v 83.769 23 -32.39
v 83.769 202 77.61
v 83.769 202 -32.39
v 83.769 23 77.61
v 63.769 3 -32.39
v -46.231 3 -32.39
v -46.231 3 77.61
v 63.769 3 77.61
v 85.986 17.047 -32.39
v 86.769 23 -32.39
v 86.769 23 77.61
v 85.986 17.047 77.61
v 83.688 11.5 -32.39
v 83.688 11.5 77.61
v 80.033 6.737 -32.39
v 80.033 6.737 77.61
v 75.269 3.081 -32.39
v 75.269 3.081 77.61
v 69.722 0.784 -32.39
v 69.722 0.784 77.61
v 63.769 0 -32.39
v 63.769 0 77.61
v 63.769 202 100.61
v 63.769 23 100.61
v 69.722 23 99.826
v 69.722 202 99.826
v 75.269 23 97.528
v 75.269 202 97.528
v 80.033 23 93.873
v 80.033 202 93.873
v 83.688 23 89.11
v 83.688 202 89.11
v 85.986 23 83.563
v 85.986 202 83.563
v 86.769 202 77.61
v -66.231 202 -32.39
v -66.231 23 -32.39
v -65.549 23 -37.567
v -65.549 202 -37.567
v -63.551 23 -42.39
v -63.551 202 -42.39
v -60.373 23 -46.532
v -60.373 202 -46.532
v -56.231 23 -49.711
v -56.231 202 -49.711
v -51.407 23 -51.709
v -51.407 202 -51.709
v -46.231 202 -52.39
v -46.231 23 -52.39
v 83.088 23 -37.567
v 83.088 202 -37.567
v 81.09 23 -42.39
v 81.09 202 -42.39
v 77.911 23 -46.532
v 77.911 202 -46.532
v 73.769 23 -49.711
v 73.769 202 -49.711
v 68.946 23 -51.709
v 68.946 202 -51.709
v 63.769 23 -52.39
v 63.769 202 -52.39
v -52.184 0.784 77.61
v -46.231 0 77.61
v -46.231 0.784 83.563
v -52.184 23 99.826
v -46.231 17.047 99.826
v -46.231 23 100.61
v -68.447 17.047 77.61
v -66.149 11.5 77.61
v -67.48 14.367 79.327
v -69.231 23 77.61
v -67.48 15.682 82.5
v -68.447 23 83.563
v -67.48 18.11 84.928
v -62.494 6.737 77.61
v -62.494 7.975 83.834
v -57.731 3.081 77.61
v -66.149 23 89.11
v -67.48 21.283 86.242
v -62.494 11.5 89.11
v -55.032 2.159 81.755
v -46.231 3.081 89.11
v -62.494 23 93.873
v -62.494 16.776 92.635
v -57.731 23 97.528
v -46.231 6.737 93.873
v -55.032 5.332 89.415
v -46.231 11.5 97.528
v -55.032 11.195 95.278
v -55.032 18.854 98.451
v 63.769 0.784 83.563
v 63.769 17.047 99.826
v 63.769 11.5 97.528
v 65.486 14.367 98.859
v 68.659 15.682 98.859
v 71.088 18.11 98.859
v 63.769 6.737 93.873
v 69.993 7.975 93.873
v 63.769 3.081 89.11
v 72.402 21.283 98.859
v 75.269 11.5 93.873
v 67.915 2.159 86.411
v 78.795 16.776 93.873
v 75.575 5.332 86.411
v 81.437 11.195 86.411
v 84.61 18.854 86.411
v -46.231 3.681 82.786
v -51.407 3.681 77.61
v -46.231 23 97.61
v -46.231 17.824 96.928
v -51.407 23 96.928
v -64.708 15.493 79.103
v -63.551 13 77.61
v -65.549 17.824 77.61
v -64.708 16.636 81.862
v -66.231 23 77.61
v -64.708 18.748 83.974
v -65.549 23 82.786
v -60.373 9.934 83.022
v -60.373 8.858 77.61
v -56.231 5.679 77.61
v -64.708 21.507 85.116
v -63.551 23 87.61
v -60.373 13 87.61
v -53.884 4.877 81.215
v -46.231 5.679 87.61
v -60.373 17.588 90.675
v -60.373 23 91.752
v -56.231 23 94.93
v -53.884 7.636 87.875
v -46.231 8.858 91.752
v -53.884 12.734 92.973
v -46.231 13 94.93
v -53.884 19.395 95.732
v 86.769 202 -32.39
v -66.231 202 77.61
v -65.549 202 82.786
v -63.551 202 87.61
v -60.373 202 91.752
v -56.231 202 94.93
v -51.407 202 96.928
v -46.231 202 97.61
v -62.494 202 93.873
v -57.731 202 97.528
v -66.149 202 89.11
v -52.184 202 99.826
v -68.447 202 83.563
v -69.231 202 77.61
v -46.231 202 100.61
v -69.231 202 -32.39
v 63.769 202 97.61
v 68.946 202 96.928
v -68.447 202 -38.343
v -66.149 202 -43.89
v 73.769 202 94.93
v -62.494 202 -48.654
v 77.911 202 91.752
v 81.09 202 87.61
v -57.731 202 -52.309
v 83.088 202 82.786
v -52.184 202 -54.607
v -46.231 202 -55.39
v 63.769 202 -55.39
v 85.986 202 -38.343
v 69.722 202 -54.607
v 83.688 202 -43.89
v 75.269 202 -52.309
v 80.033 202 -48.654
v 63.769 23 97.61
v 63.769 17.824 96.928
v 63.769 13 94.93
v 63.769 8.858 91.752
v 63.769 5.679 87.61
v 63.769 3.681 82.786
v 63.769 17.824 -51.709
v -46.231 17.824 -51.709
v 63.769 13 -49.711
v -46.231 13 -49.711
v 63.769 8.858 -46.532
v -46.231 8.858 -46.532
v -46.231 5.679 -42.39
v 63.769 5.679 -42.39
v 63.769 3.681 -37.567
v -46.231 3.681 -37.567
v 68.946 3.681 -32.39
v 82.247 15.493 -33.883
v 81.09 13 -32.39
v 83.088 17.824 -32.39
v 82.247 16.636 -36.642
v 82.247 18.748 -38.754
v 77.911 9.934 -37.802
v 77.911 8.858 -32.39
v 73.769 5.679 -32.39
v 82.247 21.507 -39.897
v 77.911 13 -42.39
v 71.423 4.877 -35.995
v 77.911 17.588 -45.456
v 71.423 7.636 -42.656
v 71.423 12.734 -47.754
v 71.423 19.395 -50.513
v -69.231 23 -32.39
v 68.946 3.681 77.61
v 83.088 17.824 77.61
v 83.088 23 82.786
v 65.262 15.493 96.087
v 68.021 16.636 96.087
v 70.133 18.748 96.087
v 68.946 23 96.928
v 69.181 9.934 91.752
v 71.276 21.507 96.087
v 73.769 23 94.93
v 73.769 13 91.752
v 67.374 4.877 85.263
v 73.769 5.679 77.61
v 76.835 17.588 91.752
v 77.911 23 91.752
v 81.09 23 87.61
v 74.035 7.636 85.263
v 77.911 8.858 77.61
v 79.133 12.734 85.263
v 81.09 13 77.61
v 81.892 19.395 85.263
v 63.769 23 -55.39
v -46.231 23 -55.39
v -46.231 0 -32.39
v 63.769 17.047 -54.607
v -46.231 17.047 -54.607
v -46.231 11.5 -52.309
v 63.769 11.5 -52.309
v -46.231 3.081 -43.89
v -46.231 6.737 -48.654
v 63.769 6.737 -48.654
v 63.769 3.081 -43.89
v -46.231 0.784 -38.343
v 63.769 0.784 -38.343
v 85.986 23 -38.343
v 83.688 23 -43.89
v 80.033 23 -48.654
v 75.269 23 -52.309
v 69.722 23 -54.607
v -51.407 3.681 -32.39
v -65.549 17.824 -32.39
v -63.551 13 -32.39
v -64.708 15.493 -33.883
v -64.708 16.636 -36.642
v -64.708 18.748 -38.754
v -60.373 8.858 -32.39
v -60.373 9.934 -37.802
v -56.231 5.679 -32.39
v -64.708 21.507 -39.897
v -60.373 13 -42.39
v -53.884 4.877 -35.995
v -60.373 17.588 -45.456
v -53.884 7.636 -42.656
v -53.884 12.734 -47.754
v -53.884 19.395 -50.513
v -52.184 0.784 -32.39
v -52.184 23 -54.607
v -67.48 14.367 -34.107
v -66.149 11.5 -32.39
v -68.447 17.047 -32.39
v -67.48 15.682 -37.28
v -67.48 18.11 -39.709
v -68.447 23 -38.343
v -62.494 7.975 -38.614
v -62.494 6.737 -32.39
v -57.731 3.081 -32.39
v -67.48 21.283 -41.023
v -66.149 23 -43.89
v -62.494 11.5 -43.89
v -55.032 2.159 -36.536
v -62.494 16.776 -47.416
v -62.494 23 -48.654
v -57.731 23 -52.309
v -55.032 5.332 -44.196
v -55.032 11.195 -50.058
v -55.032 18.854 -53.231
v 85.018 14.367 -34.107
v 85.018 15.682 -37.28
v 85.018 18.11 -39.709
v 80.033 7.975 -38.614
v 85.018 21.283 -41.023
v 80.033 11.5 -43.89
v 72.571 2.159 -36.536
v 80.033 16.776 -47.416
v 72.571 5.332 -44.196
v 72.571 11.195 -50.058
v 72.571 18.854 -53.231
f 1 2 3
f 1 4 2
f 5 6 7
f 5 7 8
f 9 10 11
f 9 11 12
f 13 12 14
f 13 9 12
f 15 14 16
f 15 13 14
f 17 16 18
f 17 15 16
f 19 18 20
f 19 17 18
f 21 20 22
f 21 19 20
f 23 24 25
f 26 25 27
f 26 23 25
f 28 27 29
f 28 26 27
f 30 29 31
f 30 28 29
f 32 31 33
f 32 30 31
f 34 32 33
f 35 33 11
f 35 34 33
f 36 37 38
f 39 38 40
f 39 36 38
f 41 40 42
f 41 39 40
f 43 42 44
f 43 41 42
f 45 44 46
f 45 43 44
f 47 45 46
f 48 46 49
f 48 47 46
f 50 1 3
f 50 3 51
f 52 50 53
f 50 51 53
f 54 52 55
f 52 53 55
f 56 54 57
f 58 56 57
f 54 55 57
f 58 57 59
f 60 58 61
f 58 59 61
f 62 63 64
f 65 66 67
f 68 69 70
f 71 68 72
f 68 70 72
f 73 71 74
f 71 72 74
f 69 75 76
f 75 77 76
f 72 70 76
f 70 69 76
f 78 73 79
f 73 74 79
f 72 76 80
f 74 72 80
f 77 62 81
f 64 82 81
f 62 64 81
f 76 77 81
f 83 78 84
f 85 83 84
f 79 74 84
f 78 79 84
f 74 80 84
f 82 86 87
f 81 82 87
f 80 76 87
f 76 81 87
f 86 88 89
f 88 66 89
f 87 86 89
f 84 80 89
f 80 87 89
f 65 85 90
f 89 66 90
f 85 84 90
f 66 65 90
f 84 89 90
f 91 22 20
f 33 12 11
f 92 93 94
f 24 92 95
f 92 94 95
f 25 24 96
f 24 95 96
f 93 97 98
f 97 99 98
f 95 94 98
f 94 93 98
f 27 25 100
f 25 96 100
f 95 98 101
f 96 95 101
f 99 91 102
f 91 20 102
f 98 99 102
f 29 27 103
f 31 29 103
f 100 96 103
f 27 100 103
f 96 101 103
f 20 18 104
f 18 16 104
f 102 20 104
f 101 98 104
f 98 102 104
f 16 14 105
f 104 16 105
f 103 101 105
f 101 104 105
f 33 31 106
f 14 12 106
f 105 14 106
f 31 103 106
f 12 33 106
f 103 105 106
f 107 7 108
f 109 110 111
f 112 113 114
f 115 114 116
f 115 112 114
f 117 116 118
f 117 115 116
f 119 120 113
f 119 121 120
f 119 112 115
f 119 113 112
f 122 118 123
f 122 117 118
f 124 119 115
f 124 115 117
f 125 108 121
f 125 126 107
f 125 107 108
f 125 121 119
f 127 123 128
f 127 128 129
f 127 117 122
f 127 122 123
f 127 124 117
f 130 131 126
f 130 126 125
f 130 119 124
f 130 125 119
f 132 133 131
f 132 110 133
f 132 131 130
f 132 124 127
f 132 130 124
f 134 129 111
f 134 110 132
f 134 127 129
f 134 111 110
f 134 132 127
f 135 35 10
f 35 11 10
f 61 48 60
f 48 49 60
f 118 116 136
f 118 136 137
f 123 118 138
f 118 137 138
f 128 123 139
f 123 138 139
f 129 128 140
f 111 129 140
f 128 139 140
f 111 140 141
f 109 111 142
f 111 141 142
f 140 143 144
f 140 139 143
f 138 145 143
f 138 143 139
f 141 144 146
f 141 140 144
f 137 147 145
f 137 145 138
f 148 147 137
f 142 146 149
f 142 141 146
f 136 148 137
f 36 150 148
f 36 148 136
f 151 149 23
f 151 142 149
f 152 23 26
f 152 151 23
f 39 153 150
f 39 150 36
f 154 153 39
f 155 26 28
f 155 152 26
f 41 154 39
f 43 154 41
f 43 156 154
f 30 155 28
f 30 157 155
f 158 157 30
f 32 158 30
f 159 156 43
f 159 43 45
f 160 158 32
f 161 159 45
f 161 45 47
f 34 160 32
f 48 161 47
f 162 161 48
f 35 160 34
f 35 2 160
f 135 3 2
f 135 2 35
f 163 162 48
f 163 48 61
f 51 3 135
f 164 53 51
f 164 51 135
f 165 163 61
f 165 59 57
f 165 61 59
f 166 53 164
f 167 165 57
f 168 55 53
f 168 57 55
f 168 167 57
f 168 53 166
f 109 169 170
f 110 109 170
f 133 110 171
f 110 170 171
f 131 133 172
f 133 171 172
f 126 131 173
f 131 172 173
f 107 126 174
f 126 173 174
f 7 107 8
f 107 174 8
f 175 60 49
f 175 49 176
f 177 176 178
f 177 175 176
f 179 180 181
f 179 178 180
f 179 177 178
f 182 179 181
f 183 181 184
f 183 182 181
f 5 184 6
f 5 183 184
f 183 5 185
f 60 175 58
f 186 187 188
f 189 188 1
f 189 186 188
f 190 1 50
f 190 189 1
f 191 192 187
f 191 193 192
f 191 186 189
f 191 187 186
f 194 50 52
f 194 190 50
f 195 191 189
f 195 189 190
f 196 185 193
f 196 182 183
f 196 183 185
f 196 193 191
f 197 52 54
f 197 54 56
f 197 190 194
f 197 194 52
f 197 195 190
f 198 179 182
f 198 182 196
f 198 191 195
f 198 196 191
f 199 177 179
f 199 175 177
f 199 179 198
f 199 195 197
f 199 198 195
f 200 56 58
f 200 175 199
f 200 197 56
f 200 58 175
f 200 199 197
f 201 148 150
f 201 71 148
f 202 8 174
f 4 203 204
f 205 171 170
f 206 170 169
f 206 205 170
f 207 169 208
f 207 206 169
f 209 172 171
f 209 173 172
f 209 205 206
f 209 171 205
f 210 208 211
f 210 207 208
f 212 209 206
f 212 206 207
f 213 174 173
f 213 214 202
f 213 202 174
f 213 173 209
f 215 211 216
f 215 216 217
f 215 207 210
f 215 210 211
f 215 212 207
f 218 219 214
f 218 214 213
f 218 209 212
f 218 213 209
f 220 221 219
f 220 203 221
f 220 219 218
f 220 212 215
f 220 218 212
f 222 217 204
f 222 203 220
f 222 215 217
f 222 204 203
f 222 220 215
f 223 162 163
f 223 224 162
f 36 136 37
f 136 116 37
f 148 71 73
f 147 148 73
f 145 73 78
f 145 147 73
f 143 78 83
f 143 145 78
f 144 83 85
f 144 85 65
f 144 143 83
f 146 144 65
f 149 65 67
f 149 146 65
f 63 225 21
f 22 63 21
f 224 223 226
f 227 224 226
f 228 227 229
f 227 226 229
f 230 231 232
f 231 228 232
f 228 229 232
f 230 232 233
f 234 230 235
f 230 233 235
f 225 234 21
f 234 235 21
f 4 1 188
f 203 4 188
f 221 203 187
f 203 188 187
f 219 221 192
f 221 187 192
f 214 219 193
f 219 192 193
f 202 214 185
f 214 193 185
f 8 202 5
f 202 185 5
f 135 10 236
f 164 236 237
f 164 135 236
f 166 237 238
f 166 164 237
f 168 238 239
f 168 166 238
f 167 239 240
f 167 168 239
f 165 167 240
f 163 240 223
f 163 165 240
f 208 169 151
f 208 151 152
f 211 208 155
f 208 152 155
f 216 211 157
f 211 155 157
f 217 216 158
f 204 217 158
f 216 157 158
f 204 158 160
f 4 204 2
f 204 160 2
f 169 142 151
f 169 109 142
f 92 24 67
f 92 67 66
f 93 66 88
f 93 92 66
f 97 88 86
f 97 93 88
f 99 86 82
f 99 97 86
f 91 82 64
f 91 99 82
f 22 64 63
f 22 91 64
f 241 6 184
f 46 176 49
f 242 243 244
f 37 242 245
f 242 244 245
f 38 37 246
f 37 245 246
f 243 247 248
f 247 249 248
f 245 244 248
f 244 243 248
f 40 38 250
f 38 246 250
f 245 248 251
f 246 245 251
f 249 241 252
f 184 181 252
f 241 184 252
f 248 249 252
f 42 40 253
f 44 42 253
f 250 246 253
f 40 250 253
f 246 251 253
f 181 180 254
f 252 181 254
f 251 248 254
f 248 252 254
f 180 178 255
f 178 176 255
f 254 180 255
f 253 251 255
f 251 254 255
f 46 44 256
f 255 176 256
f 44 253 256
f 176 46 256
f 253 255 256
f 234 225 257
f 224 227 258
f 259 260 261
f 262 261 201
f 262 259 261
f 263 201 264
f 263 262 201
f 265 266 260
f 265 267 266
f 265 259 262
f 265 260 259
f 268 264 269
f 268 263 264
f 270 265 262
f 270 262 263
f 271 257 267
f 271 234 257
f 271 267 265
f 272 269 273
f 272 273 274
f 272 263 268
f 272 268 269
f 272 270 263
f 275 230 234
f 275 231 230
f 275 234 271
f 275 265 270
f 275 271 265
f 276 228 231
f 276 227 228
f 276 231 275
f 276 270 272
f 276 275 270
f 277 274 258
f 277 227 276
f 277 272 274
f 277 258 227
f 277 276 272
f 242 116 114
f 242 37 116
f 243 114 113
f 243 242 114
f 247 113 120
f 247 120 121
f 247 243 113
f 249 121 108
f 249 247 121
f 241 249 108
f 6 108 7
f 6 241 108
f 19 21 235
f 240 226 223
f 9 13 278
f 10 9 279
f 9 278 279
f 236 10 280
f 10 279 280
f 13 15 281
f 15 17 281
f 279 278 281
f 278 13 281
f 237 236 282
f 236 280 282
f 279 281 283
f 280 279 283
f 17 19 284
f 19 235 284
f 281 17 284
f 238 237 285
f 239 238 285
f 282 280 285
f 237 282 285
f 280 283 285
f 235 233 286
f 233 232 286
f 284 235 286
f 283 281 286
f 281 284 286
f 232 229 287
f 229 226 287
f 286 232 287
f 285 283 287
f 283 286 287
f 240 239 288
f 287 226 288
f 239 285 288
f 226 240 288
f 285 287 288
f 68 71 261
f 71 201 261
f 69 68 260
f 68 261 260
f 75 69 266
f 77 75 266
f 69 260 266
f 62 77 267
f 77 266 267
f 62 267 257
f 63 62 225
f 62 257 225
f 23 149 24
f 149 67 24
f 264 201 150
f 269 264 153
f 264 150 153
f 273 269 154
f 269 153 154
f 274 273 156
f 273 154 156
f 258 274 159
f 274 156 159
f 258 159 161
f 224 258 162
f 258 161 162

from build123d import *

# Parameters (mm, degrees)
SKETCH1_W           = 156
SKETCH1_H           = 156
BOSS_EXTRUDE1_DEPTH = 202
FILLET1_R           = 23
SHELL1_T            = -3


with BuildPart() as part:
    # Sketch1 → Boss-Extrude1 (new body)
    with BuildSketch(Plane(origin=(0, 0, 0), x_dir=(1, 0, 0), z_dir=(0, 1, 0))):
        with Locations((8.769230769, -22.609756098)):
            Rectangle(SKETCH1_W, SKETCH1_H)
    extrude(amount=BOSS_EXTRUDE1_DEPTH)

    # Fillet1
    fillet1_edges = [part.edges().sort_by_distance(p)[0] for p in [
        (8.769230769, 0, -55.390243902),
        (86.769230769, 0, 22.609756098),
        (8.769230769, 0, 100.609756098),
        (-69.230769231, 0, 22.609756098),
        (-69.230769231, 101, -55.390243902),
        (86.769230769, 101, -55.390243902),
        (86.769230769, 101, 100.609756098),
        (-69.230769231, 101, 100.609756098),
    ]]
    fillet(fillet1_edges, radius=FILLET1_R)

    # Shell1
    shell1_openings = [part.faces().sort_by_distance(p)[0] for p in [
        (8.769230769, 202, 22.609756098),
    ]]
    offset(amount=SHELL1_T, openings=shell1_openings, kind=Kind.INTERSECTION)


solid = part.part
